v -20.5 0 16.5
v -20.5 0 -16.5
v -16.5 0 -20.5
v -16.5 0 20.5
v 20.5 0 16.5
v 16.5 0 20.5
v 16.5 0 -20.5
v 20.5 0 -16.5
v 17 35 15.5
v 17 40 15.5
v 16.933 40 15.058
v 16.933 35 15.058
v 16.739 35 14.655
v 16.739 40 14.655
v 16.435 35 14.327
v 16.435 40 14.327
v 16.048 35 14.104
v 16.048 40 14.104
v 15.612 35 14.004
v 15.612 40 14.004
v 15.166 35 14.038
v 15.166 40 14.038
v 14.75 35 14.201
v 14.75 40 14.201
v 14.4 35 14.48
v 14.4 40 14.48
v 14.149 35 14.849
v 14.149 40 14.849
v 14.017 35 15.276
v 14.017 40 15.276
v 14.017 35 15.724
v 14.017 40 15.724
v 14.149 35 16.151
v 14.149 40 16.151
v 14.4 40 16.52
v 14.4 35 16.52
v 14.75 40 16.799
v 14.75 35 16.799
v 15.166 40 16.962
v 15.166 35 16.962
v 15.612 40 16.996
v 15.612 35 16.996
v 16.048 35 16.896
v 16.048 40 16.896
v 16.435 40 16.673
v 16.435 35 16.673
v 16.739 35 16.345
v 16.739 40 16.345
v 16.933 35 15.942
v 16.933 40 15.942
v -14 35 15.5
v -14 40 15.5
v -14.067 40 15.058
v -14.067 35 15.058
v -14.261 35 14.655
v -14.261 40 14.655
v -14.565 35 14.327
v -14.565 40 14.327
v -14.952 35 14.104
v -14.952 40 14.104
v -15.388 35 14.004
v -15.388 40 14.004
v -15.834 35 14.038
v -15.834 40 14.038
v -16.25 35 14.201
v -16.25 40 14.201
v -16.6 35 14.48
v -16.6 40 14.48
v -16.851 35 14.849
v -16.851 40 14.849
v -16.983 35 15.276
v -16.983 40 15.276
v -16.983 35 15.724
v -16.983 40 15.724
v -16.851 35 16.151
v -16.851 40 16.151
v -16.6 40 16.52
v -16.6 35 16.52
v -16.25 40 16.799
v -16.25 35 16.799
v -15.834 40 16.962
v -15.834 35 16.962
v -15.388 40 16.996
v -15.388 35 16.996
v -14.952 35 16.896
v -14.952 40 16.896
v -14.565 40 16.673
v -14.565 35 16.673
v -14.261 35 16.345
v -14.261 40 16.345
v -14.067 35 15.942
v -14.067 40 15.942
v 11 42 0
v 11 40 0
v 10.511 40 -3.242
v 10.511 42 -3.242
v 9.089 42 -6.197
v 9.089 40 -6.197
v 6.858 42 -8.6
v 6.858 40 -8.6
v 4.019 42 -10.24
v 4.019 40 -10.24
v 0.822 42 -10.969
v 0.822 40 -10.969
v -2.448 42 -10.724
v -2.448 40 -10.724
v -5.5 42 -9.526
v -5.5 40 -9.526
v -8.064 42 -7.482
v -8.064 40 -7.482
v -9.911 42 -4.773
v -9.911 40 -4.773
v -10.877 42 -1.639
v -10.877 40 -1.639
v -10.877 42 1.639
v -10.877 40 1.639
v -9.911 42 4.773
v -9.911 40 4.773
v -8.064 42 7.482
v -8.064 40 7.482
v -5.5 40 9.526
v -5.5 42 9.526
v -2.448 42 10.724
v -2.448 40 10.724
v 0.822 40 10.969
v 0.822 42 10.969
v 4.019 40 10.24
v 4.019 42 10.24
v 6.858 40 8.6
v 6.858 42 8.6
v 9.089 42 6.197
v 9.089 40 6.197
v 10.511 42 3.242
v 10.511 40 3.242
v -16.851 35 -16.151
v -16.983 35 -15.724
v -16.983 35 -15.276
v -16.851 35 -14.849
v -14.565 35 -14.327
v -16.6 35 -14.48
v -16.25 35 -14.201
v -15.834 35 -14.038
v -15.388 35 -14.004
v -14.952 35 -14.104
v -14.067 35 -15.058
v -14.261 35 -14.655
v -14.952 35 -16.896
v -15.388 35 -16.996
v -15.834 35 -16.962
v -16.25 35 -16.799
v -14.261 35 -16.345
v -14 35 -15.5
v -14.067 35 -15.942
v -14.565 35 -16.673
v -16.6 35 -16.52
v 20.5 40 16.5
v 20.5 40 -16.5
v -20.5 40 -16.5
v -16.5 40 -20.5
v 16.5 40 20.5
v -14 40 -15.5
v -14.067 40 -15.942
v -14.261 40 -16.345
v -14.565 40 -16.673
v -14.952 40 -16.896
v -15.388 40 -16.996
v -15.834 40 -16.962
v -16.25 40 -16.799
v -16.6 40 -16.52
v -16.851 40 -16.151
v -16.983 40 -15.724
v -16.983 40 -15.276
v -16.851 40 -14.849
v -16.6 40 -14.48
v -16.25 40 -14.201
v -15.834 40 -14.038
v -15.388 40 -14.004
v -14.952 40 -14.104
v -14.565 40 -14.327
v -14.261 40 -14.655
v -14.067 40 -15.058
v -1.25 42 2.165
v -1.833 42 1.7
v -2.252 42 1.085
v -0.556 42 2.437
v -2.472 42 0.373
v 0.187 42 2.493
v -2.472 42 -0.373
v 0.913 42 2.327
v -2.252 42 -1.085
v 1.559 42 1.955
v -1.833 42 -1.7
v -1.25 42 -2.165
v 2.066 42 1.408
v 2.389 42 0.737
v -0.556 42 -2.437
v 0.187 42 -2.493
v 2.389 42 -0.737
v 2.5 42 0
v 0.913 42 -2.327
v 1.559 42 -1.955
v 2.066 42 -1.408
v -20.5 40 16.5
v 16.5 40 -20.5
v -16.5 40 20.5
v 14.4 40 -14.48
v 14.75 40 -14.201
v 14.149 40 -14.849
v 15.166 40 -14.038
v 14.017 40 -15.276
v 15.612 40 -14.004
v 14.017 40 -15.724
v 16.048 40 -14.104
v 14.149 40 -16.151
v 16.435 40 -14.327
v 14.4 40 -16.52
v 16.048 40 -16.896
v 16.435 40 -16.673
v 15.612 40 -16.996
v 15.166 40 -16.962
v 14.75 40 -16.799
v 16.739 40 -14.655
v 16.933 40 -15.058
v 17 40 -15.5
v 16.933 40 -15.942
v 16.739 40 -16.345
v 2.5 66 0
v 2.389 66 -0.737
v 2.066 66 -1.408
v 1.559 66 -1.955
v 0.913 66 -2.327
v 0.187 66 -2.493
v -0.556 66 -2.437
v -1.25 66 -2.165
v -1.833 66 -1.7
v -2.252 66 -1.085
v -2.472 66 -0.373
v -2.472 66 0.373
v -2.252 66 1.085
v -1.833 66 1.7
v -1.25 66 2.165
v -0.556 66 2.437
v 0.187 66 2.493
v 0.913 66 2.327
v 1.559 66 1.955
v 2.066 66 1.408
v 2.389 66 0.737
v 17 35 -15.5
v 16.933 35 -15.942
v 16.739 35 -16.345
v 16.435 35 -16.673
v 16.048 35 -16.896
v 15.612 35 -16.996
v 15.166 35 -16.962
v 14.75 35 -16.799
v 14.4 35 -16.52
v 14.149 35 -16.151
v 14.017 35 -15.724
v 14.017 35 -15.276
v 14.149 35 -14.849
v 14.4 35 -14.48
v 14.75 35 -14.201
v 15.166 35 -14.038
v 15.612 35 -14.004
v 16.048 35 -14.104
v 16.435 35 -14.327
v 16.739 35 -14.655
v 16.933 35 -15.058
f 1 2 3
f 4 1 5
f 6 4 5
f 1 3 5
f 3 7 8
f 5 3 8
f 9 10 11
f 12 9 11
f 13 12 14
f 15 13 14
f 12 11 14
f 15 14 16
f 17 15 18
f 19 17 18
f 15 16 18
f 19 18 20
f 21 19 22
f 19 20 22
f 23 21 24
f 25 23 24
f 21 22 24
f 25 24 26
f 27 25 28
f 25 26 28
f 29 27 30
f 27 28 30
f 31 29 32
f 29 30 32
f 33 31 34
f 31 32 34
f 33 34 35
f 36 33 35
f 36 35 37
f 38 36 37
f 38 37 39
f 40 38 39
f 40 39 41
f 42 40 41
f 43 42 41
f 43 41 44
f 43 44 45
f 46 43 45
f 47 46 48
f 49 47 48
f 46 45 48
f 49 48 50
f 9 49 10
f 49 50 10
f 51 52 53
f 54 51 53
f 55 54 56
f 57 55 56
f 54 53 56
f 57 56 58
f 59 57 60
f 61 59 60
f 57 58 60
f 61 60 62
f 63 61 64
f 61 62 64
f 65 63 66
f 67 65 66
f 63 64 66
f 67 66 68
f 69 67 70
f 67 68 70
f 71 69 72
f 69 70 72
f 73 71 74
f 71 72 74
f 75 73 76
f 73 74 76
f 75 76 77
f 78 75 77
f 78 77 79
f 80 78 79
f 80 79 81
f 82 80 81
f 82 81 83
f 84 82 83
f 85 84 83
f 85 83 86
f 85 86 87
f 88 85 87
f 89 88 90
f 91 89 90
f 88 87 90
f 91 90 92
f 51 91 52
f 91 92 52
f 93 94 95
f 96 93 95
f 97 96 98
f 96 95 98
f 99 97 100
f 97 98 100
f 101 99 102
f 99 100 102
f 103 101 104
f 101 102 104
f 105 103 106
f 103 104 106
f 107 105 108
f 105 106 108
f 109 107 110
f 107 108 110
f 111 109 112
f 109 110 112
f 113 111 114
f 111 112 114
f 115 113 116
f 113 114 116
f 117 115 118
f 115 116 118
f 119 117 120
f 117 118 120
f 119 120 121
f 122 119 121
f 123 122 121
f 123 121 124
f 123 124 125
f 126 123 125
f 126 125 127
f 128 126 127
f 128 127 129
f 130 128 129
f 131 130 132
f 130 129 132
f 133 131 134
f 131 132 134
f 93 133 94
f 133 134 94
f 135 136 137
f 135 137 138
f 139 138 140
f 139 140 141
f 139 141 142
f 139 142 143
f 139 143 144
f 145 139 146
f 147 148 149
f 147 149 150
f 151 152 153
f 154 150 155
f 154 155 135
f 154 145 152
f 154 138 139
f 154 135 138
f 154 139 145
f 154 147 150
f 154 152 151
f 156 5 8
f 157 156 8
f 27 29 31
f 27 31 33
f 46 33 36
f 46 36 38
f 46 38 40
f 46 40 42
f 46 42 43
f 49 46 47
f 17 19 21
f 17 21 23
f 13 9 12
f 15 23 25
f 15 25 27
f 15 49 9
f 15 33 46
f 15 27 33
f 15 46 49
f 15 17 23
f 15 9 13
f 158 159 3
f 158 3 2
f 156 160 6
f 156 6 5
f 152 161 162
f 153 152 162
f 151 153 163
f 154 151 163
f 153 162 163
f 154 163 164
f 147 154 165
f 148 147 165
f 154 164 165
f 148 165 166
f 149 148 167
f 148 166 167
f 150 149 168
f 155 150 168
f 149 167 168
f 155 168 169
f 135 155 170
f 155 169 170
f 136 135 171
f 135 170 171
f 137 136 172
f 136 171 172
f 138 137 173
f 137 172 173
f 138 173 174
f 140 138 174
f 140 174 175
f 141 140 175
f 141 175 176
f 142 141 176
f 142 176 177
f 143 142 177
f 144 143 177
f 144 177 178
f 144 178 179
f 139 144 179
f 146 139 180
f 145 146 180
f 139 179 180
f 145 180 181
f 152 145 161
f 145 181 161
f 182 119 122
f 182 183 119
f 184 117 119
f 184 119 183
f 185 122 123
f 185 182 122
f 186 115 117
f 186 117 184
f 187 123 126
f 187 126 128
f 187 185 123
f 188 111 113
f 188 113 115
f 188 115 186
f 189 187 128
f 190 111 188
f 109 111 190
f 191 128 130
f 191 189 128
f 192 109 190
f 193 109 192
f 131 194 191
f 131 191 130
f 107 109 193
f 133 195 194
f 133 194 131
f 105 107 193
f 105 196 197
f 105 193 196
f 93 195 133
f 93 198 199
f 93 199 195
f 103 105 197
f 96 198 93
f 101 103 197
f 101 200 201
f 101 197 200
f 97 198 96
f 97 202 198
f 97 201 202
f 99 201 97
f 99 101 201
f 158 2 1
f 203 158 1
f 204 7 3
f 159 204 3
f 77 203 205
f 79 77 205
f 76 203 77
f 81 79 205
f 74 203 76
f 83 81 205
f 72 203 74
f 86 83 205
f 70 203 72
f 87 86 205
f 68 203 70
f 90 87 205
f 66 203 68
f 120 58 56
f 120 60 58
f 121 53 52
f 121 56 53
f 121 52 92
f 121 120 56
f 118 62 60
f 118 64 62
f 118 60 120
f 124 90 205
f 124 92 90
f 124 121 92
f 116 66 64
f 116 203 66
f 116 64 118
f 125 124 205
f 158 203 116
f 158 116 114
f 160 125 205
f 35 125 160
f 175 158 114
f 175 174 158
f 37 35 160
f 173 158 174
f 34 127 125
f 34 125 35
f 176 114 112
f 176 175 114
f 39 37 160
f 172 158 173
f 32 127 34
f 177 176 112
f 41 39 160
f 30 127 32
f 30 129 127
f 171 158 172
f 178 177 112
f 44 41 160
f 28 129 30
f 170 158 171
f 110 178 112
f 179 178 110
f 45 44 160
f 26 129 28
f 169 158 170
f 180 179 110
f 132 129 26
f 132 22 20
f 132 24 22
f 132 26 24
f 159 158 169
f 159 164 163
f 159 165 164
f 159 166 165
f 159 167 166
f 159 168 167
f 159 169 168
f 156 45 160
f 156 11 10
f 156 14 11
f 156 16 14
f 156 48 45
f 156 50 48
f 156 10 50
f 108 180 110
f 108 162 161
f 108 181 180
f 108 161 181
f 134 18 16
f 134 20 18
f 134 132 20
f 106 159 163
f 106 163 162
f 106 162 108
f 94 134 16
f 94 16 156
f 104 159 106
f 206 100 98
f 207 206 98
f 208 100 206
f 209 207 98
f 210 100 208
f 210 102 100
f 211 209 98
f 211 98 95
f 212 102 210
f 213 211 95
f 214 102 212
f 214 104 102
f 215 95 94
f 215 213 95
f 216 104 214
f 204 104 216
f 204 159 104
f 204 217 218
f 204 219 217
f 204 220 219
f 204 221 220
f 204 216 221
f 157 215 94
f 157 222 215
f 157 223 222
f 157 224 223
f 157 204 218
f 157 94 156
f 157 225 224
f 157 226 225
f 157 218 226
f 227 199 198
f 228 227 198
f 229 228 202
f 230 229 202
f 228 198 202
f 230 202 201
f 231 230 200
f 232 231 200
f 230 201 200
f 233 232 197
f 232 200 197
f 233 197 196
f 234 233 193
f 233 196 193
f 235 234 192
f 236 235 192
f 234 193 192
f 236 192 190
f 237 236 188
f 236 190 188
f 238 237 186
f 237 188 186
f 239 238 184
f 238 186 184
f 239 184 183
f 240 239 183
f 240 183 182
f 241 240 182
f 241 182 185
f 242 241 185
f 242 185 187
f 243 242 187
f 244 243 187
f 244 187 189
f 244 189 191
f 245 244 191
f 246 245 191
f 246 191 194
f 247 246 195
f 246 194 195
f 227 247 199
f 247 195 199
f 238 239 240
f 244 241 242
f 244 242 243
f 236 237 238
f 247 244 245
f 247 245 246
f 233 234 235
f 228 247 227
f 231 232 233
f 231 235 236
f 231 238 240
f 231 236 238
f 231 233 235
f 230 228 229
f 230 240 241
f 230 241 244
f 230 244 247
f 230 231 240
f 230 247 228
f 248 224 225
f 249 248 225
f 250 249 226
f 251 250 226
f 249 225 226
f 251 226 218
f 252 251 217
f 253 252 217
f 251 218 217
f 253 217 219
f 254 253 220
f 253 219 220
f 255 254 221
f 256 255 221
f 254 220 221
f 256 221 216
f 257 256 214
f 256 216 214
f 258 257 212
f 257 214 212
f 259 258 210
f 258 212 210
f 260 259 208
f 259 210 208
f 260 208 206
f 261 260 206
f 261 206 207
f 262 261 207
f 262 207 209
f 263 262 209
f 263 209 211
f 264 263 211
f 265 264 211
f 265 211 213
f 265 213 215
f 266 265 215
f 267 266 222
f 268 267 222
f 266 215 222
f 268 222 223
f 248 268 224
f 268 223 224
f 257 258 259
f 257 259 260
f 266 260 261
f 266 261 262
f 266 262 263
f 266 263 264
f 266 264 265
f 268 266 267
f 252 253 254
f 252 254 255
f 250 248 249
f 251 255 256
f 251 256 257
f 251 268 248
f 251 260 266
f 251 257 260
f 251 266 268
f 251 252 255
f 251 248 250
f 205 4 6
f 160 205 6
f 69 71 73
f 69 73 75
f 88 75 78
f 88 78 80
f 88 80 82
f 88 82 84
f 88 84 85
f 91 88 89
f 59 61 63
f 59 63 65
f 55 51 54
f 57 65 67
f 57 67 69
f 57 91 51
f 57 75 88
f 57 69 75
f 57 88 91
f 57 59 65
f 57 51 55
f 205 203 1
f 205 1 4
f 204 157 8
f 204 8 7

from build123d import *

# Parameters (mm, degrees)
BOSS_EXTRUDE1_DEPTH = 40
SKETCH2_R           = 11
BOSS_EXTRUDE2_DEPTH = 2
SKETCH3_R           = 2.5
BOSS_EXTRUDE3_DEPTH = 24
SKETCH4_R           = 1.5
CUT_EXTRUDE1_DEPTH  = 5


with BuildPart() as part:
    # Sketch1 → Boss-Extrude1 (new body)
    with BuildSketch(Plane(origin=(0, 0, 0), x_dir=(1, 0, 0), z_dir=(0, 1, 0))):
        Polygon((-16.5, 20.5), (-20.5, 16.5), (-20.5, -16.5), (-16.5, -20.5), (16.5, -20.5), (20.5, -16.5), (20.5, 16.5), (16.5, 20.5), align=None)
    extrude(amount=BOSS_EXTRUDE1_DEPTH)

    # Sketch2 → Boss-Extrude2 (add)
    with BuildSketch(Plane(origin=(0, 40, 0), x_dir=(1, 0, 0), z_dir=(0, 1, 0))):
        Circle(SKETCH2_R)
    extrude(amount=BOSS_EXTRUDE2_DEPTH)

    # Sketch3 → Boss-Extrude3 (add)
    with BuildSketch(Plane(origin=(0, 42, 0), x_dir=(1, 0, 0), z_dir=(0, 1, 0))):
        Circle(SKETCH3_R)
    extrude(amount=BOSS_EXTRUDE3_DEPTH)

    # Sketch4 → Cut-Extrude1 (cut)
    with BuildSketch(Plane(origin=(0, 40, 0), x_dir=(1, 0, 0), z_dir=(0, 1, 0))):
        with Locations((-15.5, 15.5)):
            Circle(SKETCH4_R)
        with Locations((15.5, 15.5)):
            Circle(SKETCH4_R)
        with Locations((15.5, -15.5)):
            Circle(SKETCH4_R)
        with Locations((-15.5, -15.5)):
            Circle(SKETCH4_R)
    extrude(amount=-CUT_EXTRUDE1_DEPTH, mode=Mode.SUBTRACT)


solid = part.part
